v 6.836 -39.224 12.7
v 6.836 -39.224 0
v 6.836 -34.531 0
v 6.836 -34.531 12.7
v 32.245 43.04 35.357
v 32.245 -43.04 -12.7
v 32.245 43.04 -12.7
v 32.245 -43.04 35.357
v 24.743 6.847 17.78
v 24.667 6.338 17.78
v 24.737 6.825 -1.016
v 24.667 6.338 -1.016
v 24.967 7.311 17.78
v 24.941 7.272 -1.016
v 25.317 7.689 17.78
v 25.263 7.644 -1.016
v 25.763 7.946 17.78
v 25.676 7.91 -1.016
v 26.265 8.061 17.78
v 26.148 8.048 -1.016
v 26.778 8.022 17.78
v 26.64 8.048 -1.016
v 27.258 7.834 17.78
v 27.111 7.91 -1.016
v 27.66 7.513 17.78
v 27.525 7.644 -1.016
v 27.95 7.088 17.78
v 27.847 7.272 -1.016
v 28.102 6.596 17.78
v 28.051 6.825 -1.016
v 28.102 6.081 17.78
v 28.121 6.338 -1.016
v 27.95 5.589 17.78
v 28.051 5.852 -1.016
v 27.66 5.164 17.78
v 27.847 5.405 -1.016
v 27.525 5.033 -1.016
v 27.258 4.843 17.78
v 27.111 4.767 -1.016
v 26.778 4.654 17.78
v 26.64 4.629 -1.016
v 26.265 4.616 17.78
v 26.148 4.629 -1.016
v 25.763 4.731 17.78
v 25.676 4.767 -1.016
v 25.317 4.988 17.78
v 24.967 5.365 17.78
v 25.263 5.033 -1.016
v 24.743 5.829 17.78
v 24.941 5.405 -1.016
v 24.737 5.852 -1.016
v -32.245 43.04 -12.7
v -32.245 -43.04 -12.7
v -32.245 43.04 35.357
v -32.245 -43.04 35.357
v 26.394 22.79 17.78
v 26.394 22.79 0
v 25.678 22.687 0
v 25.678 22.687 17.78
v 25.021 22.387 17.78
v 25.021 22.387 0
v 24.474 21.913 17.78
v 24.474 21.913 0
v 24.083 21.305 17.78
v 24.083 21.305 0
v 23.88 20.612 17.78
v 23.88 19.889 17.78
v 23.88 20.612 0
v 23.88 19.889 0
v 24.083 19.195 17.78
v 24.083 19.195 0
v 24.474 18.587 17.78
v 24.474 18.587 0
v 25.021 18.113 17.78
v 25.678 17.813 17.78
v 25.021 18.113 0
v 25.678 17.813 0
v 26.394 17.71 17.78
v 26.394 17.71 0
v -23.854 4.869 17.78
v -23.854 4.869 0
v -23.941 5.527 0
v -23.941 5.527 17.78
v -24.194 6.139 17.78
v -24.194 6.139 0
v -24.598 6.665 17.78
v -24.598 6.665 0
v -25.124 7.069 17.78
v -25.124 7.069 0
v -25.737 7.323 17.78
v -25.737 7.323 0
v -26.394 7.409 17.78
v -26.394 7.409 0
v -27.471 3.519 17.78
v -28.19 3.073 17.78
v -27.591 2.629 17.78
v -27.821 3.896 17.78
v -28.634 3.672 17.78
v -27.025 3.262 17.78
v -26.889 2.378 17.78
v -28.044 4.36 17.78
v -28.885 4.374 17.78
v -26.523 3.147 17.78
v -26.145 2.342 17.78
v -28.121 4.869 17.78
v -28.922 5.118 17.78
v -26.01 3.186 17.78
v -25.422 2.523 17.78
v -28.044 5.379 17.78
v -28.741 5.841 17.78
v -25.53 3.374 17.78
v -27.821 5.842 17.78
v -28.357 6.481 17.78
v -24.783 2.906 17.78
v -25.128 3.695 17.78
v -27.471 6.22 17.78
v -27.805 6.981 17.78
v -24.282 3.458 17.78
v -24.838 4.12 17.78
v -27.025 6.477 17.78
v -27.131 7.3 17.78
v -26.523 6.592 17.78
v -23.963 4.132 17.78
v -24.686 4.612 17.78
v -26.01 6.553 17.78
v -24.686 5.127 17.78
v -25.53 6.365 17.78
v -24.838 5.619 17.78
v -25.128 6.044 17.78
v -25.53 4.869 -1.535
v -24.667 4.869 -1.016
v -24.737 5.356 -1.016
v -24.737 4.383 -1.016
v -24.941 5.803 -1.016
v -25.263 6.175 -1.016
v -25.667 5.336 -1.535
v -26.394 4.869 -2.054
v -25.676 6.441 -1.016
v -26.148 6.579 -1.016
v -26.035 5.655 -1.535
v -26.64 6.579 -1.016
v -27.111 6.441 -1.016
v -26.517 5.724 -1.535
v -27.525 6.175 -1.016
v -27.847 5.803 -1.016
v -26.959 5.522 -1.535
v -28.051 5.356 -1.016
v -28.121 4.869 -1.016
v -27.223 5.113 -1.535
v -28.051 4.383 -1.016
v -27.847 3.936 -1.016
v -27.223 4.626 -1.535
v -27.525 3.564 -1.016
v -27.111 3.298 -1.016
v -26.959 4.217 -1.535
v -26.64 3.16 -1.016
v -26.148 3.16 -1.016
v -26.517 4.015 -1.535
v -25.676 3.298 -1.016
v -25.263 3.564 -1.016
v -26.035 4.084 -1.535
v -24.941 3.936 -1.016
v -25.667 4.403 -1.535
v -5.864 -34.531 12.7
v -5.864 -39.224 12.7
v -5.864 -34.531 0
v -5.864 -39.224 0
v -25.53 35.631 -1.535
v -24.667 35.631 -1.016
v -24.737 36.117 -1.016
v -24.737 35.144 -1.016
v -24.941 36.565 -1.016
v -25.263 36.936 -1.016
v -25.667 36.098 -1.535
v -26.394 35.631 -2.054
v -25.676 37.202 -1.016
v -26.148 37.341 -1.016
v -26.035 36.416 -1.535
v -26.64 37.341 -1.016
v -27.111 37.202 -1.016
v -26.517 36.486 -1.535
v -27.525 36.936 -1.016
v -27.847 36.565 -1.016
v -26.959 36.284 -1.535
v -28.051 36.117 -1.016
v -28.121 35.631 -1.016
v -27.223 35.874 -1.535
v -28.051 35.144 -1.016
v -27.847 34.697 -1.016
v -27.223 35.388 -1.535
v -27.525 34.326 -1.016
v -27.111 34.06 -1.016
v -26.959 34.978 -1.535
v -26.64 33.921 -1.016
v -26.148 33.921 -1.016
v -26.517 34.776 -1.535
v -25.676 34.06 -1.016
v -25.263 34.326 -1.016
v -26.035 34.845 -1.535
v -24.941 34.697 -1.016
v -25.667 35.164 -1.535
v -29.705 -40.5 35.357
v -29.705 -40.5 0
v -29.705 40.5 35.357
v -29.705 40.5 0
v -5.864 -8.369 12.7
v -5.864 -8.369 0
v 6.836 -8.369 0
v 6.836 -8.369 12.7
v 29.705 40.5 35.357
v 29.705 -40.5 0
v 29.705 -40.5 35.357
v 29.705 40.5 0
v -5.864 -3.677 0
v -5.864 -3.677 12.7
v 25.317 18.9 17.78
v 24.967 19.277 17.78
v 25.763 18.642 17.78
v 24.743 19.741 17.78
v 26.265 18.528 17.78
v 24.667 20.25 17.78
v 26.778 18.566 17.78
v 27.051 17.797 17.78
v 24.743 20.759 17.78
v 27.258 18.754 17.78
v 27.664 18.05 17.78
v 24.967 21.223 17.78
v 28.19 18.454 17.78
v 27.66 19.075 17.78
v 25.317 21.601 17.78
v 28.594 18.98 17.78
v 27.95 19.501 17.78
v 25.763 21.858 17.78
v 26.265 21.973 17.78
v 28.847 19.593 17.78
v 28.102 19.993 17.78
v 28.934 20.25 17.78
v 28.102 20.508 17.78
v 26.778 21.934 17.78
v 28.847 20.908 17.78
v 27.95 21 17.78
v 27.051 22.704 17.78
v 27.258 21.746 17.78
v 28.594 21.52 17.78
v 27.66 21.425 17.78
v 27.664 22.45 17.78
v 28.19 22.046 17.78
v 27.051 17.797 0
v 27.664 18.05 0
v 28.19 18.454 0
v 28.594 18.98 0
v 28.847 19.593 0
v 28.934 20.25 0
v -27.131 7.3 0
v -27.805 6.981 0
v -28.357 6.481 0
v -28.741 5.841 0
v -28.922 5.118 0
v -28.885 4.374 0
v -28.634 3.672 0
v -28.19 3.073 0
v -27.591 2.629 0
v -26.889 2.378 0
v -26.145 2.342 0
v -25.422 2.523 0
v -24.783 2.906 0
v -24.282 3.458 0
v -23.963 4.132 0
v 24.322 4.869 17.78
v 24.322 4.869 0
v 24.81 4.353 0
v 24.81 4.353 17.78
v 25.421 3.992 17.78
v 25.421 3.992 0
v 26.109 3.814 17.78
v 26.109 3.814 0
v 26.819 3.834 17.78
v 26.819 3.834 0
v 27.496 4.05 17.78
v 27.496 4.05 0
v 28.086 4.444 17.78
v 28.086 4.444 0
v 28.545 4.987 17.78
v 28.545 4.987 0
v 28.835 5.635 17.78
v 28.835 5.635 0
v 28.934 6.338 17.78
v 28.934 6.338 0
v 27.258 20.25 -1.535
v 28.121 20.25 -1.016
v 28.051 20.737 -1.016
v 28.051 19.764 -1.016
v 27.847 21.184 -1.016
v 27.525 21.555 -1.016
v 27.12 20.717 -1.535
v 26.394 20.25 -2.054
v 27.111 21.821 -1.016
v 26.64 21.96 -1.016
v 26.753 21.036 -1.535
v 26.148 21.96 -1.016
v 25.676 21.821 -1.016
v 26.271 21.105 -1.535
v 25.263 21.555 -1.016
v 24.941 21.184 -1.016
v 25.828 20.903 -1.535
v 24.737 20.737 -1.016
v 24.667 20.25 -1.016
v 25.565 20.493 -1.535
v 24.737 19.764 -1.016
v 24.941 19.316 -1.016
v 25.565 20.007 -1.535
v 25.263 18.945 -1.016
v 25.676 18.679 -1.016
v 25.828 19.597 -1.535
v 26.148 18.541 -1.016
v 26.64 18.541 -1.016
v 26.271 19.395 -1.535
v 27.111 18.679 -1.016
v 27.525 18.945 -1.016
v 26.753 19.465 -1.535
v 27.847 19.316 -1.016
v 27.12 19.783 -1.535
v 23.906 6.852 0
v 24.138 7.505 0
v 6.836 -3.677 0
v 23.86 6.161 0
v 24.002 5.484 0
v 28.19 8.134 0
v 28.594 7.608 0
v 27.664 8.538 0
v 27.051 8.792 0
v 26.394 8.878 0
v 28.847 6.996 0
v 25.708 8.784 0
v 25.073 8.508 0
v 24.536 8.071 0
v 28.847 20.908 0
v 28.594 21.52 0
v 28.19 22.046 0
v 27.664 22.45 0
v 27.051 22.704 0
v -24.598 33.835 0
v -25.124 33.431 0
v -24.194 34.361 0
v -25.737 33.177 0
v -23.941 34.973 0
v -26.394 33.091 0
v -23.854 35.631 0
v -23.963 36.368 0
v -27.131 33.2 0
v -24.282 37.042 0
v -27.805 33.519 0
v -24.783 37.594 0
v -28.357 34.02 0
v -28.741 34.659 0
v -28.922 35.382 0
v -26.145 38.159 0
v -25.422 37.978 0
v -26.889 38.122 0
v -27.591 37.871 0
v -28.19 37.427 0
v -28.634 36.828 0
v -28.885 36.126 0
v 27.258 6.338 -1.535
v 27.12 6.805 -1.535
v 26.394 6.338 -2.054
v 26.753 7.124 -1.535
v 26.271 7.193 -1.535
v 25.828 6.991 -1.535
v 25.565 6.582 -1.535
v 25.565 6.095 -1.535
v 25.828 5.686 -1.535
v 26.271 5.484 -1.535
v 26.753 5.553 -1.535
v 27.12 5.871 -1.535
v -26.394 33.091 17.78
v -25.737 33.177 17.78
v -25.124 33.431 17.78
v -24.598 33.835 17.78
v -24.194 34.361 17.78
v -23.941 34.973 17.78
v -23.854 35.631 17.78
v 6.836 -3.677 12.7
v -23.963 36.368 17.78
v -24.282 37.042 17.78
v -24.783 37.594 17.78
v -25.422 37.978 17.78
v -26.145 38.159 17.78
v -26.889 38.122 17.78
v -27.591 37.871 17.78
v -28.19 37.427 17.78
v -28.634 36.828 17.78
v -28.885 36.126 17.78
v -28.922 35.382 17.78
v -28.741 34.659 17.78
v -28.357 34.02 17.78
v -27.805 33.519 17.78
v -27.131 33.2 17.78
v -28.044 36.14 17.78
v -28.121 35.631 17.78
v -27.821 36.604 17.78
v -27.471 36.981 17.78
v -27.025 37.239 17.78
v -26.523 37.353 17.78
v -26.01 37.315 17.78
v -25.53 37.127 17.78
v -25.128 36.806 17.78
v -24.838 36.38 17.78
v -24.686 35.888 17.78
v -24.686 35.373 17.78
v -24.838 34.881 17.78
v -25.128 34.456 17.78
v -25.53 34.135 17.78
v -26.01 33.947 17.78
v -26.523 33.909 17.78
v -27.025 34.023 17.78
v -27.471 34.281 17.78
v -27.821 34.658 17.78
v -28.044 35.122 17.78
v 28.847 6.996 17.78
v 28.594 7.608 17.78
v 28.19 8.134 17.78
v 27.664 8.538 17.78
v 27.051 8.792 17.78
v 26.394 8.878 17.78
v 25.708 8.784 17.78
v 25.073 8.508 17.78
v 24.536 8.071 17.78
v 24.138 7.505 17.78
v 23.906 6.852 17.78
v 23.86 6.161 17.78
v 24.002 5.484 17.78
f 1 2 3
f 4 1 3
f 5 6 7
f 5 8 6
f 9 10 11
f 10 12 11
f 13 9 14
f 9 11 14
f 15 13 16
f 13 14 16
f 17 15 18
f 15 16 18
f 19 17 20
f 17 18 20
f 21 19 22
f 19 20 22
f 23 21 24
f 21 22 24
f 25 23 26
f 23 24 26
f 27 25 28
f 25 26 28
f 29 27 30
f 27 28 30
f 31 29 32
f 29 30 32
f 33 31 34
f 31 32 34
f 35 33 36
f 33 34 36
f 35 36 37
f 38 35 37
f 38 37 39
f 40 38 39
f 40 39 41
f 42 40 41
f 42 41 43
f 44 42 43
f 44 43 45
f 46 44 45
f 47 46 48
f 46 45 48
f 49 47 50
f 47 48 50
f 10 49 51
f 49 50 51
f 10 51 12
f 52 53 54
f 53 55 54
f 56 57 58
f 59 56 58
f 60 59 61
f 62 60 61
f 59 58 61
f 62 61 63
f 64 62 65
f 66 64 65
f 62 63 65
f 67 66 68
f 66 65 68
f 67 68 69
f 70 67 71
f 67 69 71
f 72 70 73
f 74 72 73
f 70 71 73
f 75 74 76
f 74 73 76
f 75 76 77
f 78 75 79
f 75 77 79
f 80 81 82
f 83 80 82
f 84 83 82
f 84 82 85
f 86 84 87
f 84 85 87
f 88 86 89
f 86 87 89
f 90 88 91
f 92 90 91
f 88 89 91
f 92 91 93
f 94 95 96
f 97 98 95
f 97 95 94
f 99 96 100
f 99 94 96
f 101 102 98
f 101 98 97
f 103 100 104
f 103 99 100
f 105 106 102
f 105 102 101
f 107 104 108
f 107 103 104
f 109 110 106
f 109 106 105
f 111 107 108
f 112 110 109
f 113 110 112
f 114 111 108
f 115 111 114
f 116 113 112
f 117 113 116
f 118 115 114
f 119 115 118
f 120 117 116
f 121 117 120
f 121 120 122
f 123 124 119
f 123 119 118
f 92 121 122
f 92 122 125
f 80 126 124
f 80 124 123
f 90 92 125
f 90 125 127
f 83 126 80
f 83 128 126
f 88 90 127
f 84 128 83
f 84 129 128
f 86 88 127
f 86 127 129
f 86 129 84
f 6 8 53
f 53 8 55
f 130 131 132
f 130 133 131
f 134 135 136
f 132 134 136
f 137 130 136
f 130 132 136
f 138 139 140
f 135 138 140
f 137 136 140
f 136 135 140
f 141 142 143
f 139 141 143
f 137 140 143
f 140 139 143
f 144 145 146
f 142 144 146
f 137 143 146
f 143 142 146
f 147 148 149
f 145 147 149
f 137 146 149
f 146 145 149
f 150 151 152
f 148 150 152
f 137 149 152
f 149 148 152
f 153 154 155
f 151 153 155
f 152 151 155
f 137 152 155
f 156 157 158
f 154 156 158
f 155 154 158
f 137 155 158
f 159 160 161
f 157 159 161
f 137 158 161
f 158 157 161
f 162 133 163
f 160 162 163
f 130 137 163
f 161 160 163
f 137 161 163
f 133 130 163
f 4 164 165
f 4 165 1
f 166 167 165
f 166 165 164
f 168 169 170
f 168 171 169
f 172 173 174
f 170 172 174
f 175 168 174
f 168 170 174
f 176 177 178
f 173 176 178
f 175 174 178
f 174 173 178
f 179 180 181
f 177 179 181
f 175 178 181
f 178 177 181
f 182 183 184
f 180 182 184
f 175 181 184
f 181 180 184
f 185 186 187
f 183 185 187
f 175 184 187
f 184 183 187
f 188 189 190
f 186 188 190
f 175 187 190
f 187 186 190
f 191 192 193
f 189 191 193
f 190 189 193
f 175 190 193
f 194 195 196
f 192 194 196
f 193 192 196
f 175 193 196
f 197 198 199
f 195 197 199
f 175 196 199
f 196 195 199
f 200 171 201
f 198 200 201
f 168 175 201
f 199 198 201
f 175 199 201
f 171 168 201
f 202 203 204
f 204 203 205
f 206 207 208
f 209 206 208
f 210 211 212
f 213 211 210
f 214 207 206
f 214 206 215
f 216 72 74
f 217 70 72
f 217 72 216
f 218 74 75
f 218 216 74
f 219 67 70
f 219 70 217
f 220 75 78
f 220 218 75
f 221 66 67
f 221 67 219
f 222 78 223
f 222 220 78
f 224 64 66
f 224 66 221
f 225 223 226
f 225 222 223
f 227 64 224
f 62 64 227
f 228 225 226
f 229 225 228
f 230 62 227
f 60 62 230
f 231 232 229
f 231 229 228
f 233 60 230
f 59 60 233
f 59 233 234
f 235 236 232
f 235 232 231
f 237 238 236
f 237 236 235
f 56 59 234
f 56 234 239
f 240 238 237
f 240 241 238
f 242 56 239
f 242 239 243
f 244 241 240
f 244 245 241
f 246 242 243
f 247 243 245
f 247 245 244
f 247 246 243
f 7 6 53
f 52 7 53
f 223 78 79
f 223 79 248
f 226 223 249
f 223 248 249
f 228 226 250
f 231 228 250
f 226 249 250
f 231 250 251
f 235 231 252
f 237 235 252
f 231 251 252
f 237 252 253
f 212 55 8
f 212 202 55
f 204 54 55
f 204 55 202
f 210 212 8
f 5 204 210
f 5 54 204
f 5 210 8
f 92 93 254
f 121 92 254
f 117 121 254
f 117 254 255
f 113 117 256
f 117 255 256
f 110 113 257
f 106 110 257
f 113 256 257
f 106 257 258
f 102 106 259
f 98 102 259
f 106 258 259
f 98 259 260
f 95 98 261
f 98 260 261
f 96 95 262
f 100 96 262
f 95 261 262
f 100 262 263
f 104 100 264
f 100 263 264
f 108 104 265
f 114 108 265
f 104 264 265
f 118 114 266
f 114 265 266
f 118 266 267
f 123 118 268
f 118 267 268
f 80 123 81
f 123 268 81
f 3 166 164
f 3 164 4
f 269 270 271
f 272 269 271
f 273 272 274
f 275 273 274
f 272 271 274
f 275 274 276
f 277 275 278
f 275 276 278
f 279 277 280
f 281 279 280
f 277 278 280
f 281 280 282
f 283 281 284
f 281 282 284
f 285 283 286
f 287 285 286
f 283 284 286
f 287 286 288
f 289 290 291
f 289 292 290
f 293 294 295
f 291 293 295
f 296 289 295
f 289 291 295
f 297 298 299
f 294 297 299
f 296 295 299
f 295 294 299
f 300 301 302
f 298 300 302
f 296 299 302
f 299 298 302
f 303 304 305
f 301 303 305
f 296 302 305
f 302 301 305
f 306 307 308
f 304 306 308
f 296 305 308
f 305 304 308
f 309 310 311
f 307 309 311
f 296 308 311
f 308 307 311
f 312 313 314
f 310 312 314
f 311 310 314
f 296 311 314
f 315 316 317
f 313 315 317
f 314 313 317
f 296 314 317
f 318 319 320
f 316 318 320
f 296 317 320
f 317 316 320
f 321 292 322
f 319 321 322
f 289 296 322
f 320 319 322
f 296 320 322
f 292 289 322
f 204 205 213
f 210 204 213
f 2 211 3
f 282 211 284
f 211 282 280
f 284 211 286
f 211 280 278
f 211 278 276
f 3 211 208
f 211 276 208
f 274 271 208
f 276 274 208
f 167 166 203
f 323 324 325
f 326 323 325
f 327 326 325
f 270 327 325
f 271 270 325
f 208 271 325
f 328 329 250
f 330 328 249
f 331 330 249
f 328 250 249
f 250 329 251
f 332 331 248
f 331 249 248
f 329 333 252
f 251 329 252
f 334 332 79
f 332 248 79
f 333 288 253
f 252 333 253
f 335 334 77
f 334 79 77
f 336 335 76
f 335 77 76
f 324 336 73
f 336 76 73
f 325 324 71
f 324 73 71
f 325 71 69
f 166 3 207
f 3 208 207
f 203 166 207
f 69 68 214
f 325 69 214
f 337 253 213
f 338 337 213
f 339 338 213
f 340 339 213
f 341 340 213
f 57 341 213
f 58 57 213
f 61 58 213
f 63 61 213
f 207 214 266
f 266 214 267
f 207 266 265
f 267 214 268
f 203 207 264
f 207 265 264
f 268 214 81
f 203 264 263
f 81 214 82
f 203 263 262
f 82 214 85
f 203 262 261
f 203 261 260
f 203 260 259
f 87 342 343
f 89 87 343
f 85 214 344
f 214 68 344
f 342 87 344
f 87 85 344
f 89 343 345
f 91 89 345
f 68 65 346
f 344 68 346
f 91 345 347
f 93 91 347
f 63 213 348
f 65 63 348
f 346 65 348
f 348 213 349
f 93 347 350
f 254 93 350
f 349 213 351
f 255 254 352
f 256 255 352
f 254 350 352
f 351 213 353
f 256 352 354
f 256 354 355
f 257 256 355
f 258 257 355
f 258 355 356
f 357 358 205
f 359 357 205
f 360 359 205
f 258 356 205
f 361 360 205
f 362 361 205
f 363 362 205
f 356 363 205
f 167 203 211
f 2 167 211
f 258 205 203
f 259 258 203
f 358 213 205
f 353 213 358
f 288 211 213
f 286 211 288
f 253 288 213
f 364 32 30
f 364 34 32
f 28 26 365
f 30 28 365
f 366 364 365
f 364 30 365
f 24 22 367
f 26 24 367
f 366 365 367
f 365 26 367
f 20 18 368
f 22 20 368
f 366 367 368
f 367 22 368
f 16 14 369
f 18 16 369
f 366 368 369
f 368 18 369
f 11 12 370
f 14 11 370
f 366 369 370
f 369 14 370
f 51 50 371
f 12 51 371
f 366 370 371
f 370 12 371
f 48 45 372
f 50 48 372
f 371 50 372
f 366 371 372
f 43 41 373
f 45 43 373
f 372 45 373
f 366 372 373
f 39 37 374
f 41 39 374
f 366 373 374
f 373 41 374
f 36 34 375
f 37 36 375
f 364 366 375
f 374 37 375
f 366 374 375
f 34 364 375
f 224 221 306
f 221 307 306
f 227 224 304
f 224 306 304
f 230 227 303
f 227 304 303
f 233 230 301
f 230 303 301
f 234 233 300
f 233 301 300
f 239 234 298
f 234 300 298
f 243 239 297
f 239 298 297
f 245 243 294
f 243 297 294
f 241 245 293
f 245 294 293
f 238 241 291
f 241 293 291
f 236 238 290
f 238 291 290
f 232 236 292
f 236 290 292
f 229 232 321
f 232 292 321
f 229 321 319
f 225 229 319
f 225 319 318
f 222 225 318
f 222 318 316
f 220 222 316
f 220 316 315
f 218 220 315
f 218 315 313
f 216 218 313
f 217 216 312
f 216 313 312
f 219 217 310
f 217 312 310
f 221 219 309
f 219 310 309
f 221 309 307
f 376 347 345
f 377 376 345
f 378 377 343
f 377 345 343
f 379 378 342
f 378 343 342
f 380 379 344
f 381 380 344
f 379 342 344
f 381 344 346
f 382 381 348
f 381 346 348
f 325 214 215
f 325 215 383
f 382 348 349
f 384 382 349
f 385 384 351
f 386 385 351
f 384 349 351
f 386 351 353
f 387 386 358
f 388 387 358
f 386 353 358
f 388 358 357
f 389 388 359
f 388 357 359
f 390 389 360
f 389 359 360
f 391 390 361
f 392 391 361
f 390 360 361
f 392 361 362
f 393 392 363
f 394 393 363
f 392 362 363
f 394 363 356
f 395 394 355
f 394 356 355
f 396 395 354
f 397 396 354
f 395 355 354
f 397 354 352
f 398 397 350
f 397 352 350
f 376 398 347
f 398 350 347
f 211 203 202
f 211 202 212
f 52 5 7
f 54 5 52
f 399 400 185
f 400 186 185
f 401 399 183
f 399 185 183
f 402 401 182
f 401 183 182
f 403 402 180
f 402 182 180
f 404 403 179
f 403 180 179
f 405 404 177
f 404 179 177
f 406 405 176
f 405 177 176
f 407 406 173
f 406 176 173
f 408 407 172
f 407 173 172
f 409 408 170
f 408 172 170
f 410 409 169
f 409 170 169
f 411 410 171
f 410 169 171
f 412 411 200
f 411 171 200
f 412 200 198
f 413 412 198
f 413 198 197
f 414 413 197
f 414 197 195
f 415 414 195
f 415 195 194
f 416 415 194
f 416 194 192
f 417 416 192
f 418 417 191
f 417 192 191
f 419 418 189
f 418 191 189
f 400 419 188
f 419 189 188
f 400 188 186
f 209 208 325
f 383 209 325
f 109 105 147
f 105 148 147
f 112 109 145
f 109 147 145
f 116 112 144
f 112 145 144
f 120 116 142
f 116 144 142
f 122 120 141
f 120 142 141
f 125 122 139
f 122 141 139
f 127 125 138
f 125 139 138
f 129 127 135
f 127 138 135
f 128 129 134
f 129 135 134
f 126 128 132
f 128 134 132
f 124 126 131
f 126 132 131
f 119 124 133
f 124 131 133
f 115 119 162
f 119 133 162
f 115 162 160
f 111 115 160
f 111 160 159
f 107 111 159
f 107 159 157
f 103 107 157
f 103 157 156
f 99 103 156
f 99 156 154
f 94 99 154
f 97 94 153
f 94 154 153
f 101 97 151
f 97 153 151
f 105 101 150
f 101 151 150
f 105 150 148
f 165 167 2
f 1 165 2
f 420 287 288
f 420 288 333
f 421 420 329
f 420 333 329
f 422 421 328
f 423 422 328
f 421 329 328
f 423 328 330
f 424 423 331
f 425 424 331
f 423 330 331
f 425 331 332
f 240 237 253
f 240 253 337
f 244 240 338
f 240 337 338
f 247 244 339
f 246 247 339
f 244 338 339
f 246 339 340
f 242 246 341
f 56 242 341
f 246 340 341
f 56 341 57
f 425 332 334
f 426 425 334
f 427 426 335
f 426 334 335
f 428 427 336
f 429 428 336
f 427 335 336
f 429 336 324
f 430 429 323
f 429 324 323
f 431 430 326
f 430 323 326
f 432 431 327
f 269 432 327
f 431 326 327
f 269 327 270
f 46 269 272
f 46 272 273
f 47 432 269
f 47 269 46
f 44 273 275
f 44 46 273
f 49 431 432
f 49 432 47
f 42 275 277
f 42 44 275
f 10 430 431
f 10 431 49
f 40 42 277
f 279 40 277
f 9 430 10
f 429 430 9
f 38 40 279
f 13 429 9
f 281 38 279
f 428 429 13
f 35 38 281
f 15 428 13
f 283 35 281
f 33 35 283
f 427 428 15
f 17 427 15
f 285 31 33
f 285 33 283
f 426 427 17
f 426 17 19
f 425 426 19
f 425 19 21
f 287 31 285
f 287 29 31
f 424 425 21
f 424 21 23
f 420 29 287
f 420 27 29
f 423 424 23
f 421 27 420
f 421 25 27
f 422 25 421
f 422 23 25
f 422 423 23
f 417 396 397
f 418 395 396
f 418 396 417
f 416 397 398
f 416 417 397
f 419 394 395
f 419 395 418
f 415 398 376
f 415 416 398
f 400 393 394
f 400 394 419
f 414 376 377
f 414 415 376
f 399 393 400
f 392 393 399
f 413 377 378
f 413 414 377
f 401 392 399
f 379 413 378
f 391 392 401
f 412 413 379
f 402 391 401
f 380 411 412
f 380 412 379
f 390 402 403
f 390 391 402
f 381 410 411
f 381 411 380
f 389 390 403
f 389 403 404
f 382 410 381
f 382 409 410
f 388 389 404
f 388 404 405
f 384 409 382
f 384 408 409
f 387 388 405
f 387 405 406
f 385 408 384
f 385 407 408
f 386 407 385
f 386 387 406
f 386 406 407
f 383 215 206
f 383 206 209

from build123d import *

# Parameters (mm, degrees)
SKETCH1_W                 = 64.4906
SKETCH1_H                 = 86.0806
SKETCH1_W_2               = 59.4106
SKETCH1_H_2               = 81.0006
EXTRUDE_THIN1_DEPTH       = 35.3568
SKETCH2_W                 = 64.4906
SKETCH2_H                 = 86.0806
BOSS_EXTRUDE1_DEPTH       = 12.7
SKETCH3_W                 = 12.7
SKETCH3_H                 = 4.692408937
BOSS_EXTRUDE3_DEPTH       = 12.7
BOSS_EXTRUDE4_DEPTH       = 17.78
F_8_32_TAPPED_HOLE1_D     = 3.4544
F_8_32_TAPPED_HOLE1_DEPTH = 18.796
F_8_32_TAPPED_HOLE1_TIP   = 1.037806461


with BuildPart() as part:
    # Sketch1 → Extrude-Thin1 (new body)
    with BuildSketch(Plane.XY):
        Rectangle(SKETCH1_W, SKETCH1_H)
        Rectangle(SKETCH1_W_2, SKETCH1_H_2, mode=Mode.SUBTRACT)
    extrude(amount=EXTRUDE_THIN1_DEPTH)

    # Sketch2 → Boss-Extrude1 (add)
    with BuildSketch(Plane(origin=(0, 0, 0), x_dir=(-1, 0, 0), z_dir=(0, 0, -1))):
        Rectangle(SKETCH2_W, SKETCH2_H)
    extrude(amount=BOSS_EXTRUDE1_DEPTH)

    # Sketch3 → Boss-Extrude3 (add)
    with BuildSketch(Plane.XY):
        with Locations((0.486291995, -6.023095532)):
            Rectangle(SKETCH3_W, SKETCH3_H)
        with Locations((0.486291995, -36.877504469)):
            Rectangle(SKETCH3_W, SKETCH3_H)
    extrude(amount=BOSS_EXTRUDE3_DEPTH)

    # Sketch5 → Boss-Extrude4 (add)
    with BuildSketch(Plane.XY):
        with BuildLine():
            Line((-26.393952246, 7.409416617), (-26.393952246, 4.869416617))
            Line((-26.393952246, 4.869416617), (-23.853952246, 4.869416617))
            ThreePointArc((-23.853952246, 4.869416617), (-24.597901022, 6.665467841), (-26.393952246, 7.409416617))
        make_face()
        with BuildLine():
            Line((-23.853952246, 4.869416617), (-26.393952246, 4.869416617))
            Line((-26.393952246, 4.869416617), (-26.393952246, 7.409416617))
            ThreePointArc((-26.393952246, 7.409416617), (-28.19000347, 3.073365392), (-23.853952246, 4.869416617))
        make_face()
        with BuildLine():
            ThreePointArc((-23.853952246, 35.630883383), (-28.19000347, 37.426934608), (-26.393952246, 33.090883383))
            Line((-26.393952246, 33.090883383), (-26.393952246, 35.630883383))
            Line((-26.393952246, 35.630883383), (-23.853952246, 35.630883383))
        make_face()
        with BuildLine():
            Line((-26.393952246, 35.630883383), (-26.393952246, 33.090883383))
            ThreePointArc((-26.393952246, 33.090883383), (-24.597901022, 33.834832159), (-23.853952246, 35.630883383))
            Line((-23.853952246, 35.630883383), (-26.393952246, 35.630883383))
        make_face()
        with BuildLine():
            ThreePointArc((26.393952246, 22.79015), (23.853952246, 20.25015), (26.393952246, 17.71015))
            Line((26.393952246, 17.71015), (26.393952246, 22.79015))
        make_face()
        with BuildLine():
            Line((26.393952246, 22.79015), (26.393952246, 17.71015))
            ThreePointArc((26.393952246, 17.71015), (28.19000347, 18.454098776), (28.933952246, 20.25015))
            ThreePointArc((28.933952246, 20.25015), (28.19000347, 22.046201224), (26.393952246, 22.79015))
        make_face()
        with BuildLine():
            ThreePointArc((26.393952246, 8.878390919), (24.137539747, 7.504668174), (24.321824233, 4.869416617))
            Line((24.321824233, 4.869416617), (26.393952246, 4.869416617))
            Line((26.393952246, 4.869416617), (26.393952246, 8.878390919))
        make_face()
        with BuildLine():
            Line((26.393952246, 4.869416617), (24.321824233, 4.869416617))
            ThreePointArc((24.321824233, 4.869416617), (27.164794269, 3.918183784), (28.933952246, 6.338390919))
            ThreePointArc((28.933952246, 6.338390919), (28.19000347, 8.134442143), (26.393952246, 8.878390919))
            Line((26.393952246, 8.878390919), (26.393952246, 4.869416617))
        make_face()
    extrude(amount=BOSS_EXTRUDE4_DEPTH)

    # #8-32 Tapped Hole1
    with Locations(Plane(origin=(-26.393952246, 4.869416617, 17.78), x_dir=(1, 0, 0), z_dir=(0, 0, 1))):
        with Locations((0, 0), (0, 30.761466766), (52.787904492, 15.380733383), (52.787904492, 1.468974302)):
            Hole(F_8_32_TAPPED_HOLE1_D / 2, depth=F_8_32_TAPPED_HOLE1_DEPTH)
            with Locations((0, 0, -(F_8_32_TAPPED_HOLE1_DEPTH + F_8_32_TAPPED_HOLE1_TIP / 2))):  # 118° drill point
                Cone(0, F_8_32_TAPPED_HOLE1_D / 2, F_8_32_TAPPED_HOLE1_TIP, mode=Mode.SUBTRACT)


solid = part.part
